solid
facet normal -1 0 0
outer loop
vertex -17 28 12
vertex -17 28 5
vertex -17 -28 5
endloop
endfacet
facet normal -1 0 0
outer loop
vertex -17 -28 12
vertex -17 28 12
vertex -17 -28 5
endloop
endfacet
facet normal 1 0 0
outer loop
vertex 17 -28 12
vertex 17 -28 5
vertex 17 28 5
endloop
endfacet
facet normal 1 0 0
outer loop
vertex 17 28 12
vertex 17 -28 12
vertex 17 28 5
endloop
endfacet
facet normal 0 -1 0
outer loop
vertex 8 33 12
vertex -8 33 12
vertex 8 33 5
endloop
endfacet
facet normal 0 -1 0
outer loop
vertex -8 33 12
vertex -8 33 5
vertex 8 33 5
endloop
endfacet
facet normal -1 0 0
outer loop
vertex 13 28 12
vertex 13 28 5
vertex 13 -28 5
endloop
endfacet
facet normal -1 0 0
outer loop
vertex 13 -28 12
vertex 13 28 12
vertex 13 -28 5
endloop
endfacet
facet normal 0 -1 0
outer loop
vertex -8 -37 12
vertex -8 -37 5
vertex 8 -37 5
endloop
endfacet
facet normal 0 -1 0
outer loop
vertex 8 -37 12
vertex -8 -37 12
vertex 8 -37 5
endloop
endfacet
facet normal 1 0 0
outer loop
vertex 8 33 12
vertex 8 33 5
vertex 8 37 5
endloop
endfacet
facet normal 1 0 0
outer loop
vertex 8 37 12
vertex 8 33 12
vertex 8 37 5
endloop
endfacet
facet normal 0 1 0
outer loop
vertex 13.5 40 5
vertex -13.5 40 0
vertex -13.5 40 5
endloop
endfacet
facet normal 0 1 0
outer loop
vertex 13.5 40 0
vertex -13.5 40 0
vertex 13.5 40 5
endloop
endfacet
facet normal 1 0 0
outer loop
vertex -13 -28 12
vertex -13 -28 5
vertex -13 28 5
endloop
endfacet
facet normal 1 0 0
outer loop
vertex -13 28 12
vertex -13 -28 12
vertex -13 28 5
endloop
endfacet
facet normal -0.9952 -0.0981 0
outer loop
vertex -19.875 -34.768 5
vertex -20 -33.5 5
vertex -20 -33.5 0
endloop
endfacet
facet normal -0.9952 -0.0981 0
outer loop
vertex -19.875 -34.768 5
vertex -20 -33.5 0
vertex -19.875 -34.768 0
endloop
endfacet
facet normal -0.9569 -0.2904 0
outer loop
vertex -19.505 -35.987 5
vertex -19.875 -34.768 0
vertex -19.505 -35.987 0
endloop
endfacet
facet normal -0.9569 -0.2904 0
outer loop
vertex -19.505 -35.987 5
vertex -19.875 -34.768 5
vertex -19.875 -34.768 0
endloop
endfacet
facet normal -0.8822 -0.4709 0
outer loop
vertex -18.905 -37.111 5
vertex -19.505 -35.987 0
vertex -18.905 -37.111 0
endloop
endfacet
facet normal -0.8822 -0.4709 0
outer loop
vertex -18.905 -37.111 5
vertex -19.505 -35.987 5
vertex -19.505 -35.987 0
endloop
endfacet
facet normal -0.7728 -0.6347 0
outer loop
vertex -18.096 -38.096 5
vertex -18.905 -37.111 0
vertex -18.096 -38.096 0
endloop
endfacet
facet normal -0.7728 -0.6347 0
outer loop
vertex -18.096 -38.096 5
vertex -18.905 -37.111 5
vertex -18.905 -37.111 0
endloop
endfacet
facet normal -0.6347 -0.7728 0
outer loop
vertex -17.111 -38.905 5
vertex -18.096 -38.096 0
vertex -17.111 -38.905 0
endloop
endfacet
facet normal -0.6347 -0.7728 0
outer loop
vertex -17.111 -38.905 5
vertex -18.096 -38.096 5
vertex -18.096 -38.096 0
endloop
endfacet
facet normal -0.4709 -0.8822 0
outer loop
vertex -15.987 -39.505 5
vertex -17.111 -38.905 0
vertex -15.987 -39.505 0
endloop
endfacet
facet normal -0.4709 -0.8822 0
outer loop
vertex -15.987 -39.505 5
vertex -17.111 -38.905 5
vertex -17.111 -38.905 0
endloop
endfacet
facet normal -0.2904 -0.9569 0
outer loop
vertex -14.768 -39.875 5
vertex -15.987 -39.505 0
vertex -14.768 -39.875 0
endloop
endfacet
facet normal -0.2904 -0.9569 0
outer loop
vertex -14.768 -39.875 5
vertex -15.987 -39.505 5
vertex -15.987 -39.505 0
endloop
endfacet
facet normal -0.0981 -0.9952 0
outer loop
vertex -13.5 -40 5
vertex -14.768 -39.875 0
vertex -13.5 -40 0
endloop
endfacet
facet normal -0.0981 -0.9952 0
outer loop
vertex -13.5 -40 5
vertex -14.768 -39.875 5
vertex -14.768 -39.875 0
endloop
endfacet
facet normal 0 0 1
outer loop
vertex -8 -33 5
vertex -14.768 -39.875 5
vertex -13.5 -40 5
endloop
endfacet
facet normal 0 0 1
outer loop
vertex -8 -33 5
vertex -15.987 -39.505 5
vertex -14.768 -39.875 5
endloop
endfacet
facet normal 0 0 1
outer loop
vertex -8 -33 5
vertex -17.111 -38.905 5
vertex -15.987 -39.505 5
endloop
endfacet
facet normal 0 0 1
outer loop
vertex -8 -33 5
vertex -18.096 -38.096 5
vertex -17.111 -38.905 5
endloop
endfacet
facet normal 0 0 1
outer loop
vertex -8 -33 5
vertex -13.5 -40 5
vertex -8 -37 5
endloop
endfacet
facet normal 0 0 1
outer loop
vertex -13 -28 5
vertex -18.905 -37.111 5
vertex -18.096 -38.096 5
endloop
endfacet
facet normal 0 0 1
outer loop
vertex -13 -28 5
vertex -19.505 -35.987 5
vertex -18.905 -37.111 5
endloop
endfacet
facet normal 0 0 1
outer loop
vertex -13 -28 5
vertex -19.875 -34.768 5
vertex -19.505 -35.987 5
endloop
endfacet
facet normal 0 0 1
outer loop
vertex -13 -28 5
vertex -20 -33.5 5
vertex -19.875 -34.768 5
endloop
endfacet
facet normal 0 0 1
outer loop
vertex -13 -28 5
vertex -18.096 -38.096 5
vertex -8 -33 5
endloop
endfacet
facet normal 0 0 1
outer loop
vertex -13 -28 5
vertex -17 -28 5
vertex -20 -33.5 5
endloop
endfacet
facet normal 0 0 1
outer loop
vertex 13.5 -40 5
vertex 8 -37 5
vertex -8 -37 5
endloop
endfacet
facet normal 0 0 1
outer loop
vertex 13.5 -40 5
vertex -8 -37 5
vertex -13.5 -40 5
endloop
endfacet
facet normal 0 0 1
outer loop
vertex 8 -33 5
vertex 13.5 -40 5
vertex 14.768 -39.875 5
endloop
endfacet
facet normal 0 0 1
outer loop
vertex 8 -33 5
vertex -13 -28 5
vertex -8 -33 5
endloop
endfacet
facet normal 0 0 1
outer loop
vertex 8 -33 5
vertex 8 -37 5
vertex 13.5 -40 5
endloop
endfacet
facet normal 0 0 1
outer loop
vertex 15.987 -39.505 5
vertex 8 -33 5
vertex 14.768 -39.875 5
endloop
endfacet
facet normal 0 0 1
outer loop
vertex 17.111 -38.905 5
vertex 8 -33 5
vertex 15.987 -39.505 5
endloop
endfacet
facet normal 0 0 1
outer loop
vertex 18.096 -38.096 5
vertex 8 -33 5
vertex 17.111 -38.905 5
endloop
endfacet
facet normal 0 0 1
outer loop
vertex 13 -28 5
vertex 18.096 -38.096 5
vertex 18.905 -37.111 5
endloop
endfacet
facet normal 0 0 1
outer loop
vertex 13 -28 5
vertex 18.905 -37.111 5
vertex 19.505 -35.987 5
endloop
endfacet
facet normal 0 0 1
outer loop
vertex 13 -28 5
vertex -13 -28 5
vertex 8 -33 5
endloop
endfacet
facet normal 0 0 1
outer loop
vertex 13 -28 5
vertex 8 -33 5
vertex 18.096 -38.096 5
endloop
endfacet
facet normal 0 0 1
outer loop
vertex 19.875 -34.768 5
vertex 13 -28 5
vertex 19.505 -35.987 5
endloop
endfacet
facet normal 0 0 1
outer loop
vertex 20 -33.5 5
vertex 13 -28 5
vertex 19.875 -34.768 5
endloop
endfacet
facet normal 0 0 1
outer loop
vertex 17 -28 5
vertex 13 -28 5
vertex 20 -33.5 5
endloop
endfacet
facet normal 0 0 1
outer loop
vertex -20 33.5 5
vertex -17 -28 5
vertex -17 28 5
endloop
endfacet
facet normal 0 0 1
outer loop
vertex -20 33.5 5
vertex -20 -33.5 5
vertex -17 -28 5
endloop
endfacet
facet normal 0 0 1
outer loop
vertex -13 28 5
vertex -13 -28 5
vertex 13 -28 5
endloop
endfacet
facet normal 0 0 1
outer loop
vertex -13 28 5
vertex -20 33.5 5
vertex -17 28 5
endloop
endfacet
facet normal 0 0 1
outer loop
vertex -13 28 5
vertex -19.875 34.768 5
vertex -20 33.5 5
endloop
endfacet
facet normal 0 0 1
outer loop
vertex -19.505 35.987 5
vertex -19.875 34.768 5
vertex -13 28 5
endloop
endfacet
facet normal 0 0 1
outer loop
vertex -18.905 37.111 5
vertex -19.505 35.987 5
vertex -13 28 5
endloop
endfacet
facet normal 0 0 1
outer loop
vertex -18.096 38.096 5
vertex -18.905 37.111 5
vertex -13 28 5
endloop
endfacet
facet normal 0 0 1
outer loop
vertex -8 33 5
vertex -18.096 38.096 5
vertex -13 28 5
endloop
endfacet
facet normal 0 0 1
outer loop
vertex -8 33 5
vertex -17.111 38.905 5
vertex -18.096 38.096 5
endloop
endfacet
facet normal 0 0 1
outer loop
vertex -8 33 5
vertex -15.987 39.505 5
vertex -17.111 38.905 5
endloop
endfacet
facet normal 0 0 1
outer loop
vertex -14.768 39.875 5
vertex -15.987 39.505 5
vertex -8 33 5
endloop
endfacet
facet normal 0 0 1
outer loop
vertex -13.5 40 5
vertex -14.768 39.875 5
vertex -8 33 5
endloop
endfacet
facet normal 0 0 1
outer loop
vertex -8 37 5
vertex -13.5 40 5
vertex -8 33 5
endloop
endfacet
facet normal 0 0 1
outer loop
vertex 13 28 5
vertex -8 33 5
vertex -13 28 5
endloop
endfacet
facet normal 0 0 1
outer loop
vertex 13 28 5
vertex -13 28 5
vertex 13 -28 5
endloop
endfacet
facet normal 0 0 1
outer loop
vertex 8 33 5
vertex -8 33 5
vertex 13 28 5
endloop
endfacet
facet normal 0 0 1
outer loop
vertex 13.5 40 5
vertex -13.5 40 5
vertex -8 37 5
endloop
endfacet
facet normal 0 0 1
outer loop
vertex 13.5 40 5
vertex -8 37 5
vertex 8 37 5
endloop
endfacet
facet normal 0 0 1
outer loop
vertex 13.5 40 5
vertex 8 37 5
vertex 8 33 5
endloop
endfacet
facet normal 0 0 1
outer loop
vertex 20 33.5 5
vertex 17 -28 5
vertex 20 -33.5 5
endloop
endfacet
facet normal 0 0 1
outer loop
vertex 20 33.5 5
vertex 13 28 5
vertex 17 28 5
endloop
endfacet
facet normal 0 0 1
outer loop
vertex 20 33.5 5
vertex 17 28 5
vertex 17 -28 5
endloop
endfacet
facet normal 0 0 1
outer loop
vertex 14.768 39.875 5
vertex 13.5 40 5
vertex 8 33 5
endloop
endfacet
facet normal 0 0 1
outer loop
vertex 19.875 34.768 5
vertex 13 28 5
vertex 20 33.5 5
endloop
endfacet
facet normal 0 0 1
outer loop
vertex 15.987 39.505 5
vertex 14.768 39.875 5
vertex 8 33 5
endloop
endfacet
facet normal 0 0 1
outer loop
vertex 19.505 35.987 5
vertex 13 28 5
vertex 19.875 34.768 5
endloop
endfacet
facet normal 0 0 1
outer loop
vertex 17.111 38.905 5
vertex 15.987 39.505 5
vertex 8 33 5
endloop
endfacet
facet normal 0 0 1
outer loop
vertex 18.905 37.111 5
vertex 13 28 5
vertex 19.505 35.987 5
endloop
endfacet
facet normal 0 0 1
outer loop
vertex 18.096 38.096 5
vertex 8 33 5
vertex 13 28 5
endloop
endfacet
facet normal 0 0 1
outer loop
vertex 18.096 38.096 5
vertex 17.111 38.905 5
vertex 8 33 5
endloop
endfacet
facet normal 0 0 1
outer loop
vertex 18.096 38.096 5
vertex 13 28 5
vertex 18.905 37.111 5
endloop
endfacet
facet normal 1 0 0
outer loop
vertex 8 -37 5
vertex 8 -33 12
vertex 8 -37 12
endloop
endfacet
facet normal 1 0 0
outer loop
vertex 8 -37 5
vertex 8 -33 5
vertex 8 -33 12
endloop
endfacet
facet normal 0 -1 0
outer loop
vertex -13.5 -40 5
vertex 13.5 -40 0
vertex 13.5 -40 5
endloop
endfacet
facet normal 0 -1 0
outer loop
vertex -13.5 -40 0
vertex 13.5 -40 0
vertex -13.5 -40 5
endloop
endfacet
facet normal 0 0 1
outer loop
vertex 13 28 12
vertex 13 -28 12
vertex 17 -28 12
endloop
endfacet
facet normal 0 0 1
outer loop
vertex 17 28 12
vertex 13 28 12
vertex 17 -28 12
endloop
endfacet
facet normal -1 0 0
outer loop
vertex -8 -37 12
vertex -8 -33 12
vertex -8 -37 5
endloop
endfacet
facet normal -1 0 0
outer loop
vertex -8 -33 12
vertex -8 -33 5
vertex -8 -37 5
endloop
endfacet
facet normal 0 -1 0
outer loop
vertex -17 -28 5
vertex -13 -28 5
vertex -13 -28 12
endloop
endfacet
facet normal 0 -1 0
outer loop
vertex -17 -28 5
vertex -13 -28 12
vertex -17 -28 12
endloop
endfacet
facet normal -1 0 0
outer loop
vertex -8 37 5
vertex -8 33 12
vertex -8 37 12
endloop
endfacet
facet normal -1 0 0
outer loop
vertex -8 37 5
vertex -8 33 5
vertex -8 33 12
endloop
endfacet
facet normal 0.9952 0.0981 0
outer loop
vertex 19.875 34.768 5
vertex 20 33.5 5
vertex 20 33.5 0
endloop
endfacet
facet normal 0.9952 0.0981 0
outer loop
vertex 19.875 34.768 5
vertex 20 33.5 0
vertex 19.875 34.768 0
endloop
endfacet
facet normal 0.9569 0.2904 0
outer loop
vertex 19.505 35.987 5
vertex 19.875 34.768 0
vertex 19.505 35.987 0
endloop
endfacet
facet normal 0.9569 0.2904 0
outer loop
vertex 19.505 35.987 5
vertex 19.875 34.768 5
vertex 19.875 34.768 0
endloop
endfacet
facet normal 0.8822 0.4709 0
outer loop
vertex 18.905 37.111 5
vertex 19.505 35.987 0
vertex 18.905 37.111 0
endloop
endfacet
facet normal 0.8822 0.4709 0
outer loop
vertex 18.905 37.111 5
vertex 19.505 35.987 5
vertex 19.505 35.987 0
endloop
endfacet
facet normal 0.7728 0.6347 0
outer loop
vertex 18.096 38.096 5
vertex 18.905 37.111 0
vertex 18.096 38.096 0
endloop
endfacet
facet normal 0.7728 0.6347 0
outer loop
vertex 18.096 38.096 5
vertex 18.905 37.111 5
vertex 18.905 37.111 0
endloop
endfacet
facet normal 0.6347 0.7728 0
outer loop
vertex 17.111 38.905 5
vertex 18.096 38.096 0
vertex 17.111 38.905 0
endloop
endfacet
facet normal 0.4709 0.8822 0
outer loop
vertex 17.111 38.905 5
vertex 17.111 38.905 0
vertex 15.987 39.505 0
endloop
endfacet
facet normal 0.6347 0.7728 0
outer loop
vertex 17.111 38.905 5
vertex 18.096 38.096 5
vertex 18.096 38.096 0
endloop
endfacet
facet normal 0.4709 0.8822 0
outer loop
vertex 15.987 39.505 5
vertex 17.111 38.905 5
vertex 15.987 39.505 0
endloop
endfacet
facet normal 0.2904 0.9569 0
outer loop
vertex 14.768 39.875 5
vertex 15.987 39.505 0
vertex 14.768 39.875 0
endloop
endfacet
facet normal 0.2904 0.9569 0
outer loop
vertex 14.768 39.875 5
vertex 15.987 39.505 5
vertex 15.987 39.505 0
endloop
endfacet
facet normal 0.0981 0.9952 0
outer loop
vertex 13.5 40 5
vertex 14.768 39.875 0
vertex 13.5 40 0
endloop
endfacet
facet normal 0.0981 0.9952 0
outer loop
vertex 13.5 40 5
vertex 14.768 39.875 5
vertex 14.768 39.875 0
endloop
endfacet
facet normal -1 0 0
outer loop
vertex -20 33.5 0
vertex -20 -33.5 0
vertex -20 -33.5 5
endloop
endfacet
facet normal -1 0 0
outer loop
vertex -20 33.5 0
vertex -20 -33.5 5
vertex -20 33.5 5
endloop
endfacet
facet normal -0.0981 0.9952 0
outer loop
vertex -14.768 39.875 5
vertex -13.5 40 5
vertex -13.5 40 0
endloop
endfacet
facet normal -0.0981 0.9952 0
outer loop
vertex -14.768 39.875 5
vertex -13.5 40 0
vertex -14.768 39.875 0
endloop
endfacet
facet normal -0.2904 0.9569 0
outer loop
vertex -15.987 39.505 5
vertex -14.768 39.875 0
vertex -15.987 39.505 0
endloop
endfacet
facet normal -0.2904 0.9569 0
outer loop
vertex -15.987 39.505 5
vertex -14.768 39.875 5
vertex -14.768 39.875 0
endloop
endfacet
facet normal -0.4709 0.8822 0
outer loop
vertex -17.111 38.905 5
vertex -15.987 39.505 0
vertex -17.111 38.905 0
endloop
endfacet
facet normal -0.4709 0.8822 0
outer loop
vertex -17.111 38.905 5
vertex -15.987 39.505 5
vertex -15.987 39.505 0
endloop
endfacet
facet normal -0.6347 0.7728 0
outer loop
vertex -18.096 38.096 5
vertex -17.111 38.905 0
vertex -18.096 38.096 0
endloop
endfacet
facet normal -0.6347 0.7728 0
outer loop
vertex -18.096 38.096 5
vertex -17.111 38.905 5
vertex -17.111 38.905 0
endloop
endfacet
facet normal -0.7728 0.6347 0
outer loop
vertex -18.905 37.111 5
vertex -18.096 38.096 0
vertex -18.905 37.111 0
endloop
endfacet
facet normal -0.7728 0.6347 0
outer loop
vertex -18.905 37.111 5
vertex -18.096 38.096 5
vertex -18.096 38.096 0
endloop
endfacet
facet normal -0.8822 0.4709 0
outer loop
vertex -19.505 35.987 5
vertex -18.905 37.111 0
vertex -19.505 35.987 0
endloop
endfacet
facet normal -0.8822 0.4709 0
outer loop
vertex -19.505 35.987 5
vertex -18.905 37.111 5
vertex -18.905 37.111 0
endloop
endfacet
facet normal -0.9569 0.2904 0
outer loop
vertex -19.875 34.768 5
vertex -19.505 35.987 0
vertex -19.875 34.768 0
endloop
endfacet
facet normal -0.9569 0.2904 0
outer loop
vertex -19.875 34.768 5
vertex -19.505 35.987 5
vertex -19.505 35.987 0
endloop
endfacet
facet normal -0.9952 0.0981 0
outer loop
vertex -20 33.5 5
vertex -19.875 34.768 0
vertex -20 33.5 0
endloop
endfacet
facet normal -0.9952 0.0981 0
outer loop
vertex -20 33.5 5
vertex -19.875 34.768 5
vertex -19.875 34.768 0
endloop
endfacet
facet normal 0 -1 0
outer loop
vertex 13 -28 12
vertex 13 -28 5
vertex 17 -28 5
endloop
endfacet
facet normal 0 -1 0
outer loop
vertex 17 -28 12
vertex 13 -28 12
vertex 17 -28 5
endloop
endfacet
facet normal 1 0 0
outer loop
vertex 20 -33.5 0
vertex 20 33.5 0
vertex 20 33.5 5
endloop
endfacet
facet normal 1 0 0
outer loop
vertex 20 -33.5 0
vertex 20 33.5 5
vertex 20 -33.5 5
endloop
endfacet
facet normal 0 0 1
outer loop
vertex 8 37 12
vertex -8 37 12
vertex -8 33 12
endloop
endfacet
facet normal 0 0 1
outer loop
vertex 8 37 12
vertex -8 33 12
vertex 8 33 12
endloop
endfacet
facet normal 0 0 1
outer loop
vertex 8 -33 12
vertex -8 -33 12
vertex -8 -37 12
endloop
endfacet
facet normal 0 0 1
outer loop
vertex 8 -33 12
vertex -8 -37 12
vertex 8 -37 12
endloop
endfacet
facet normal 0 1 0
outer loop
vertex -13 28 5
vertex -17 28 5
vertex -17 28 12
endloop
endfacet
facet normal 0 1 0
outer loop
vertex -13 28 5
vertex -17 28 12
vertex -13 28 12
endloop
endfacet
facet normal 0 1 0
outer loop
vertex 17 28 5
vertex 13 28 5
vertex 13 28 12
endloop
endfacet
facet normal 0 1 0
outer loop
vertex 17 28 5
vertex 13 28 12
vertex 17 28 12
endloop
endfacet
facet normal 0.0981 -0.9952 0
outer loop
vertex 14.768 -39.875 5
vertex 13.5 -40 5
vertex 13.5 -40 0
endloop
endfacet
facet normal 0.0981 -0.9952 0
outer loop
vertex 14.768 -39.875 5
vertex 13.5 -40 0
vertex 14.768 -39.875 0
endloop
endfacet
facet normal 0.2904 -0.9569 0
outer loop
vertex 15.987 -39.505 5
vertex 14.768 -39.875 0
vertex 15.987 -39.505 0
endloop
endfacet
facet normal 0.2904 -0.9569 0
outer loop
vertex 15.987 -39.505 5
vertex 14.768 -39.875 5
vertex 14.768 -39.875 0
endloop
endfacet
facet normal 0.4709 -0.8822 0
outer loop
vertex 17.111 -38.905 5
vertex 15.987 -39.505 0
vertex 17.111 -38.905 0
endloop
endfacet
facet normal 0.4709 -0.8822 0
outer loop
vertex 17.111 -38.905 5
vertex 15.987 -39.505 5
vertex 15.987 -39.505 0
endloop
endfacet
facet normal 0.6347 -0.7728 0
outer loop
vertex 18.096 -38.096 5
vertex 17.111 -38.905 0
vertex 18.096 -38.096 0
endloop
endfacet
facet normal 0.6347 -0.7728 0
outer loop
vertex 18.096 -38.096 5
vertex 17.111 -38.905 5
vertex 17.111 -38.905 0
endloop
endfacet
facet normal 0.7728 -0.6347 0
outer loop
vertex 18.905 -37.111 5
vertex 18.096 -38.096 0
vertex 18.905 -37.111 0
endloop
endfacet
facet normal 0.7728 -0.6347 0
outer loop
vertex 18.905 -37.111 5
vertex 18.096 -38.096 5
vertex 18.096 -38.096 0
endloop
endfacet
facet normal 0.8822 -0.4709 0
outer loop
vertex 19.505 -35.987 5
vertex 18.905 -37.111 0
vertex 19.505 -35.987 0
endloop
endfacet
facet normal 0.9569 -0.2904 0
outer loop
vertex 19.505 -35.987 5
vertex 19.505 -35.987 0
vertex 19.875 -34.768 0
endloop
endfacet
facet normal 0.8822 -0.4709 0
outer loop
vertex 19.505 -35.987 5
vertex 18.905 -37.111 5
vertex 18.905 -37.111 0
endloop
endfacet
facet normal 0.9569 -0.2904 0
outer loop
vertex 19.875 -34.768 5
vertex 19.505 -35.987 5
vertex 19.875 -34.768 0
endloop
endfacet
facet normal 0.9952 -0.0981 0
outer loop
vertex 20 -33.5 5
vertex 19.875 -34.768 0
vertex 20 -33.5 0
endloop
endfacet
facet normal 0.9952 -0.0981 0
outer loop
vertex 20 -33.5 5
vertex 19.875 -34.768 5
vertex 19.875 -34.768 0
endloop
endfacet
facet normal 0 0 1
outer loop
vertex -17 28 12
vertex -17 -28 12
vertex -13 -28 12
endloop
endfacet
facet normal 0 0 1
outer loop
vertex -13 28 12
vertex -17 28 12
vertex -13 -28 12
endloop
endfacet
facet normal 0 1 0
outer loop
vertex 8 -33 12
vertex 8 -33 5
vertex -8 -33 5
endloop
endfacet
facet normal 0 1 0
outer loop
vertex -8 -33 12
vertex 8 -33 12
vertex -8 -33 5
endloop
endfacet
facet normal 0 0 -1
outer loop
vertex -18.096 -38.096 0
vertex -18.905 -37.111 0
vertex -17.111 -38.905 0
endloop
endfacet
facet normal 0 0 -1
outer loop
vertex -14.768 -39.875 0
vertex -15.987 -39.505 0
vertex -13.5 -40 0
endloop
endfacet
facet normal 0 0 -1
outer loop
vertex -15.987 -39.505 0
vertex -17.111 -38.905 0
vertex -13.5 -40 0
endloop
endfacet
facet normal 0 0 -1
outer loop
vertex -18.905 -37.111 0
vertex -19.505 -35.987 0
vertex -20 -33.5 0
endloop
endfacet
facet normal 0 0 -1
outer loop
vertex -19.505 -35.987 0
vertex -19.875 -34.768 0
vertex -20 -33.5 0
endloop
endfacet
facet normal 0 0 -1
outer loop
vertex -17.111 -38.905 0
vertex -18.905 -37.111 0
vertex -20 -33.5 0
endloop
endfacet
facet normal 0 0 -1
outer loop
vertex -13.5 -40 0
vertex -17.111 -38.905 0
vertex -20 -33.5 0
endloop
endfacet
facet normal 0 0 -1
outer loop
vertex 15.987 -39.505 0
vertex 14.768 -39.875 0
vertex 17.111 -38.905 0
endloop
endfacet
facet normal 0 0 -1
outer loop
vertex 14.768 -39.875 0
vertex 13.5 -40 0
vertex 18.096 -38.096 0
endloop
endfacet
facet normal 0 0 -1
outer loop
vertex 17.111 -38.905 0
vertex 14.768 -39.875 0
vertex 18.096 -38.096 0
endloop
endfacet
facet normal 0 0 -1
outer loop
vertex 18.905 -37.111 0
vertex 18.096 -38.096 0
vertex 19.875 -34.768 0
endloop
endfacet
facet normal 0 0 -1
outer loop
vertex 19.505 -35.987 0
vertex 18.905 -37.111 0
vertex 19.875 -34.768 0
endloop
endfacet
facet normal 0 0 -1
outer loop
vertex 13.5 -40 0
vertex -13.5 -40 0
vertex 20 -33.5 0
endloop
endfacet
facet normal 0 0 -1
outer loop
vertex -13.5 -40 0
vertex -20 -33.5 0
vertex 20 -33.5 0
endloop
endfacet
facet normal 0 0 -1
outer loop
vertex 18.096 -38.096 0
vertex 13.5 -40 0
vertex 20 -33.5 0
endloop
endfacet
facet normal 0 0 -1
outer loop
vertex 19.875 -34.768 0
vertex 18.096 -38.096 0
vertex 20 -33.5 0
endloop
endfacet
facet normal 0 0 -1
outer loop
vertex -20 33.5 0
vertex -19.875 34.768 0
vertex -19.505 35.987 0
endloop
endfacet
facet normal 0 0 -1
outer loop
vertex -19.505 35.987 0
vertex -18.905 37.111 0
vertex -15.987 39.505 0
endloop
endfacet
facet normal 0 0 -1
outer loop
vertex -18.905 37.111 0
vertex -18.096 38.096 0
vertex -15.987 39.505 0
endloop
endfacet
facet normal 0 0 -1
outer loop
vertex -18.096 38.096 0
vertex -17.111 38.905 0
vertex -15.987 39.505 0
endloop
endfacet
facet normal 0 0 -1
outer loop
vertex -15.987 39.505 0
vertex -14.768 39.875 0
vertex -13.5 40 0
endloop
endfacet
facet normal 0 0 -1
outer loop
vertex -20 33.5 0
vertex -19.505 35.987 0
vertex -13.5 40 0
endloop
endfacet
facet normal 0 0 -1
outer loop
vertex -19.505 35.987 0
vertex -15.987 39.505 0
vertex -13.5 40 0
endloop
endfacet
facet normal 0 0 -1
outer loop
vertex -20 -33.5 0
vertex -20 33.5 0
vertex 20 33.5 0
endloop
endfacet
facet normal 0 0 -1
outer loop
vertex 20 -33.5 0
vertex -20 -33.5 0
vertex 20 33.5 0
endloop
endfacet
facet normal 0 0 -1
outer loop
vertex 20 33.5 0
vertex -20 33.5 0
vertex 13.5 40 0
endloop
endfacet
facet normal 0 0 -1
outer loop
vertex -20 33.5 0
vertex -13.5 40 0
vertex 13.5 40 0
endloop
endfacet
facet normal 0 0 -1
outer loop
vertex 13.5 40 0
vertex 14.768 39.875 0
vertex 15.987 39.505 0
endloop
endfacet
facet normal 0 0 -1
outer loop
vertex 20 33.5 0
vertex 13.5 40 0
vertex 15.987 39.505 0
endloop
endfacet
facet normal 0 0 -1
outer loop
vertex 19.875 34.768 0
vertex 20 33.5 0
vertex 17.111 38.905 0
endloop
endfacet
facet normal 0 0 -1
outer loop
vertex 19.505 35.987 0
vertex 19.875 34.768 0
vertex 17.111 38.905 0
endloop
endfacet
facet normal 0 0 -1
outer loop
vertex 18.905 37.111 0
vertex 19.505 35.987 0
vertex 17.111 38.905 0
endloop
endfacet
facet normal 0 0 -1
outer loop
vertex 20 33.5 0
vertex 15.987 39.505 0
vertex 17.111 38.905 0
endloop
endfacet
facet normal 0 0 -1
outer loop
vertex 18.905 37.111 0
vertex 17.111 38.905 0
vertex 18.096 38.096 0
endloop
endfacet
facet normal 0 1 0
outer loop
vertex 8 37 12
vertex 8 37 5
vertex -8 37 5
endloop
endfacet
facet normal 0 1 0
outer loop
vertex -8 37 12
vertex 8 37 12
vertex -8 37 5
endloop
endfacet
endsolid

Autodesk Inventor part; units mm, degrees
ref_plane "YZ Plane" through (0, 0, 0) normal (1, 0, 0) x (0, 1, 0)
ref_plane "XZ Plane" through (0, 0, 0) normal (0, 1, 0) x (-1, 0, 0)
ref_plane "XY Plane" through (0, 0, 0) normal (0, 0, 1) x (1, 0, 0)
sketch "Boceto1" plane through (0, 0, 0) normal (0, 0, 1) x (1, 0, 0)
  line L0 (20, -40) -> (-20, -40)
  line L1 (-20, -40) -> (-20, 40)
  line L2 (-20, 40) -> (20, 40)
  line L3 (20, 40) -> (20, -40)
  line L4 (20, -40) -> (-20, 40) construction
  line L5 (-20, -40) -> (20, 40) construction
  point P0 (0, 0)
  dimension "d0" = 40
  dimension "d22" = 80
extrude "Extrusión1" add sketch "Boceto1" along normal blind 5
sketch "Boceto2" plane through (0, 0, 5) normal (0, 0, 1) x (1, 0, 0)
  line L0 (17.5, -37.5) -> (-17.5, -37.5)
  line L1 (-17.5, -37.5) -> (-17.5, 37.5)
  line L2 (-17.5, 37.5) -> (17.5, 37.5)
  line L3 (17.5, 37.5) -> (17.5, -37.5)
  line L4 (17.5, -37.5) -> (-17.5, 37.5) construction
  line L5 (-17.5, -37.5) -> (17.5, 37.5) construction
  line L6 (17, 37) -> (-17, 37)
  line L7 (-17, 37) -> (-17, -37)
  line L8 (-17, -37) -> (17, -37)
  line L9 (17, -37) -> (17, 37)
  line L10 (-13, 33) -> (13, 33)
  line L11 (13, 33) -> (13, -33)
  line L12 (13, -33) -> (-13, -33)
  line L13 (-13, -33) -> (-13, 33)
  line L14 (8, 33) -> (8, 37)
  line L15 (-8, 33) -> (-8, 37)
  line L16 (13, 28) -> (17, 28)
  line L17 (13, -28) -> (17, -28)
  line L18 (-13, -28) -> (-17, -28)
  line L19 (-8, -33) -> (-8, -37)
  line L20 (8, -33) -> (8, -37)
  line L21 (-17, 28) -> (-13, 28)
  point P0 (0, 0)
  dimension "d5" = 35
  dimension "d6" = 75
  dimension "d7" = 0.5
  dimension "d8" = 4
  dimension "d9" = 5
  dimension "d10" = 5
  dimension "d11" = 5
  dimension "d12" = 5
  dimension "d13" = 5
  dimension "d14" = 5
  dimension "d15" = 5
  dimension "d16" = 5
extrude "Extrusión2" add sketch "Boceto2" along normal blind 7 contours L14 L10 L15 L6 | L9 L17 L11 L16 | L21 L13 L18 L7 | L8 L19 L12 L20
fillet "Empalme3" radius 6.5 4 edges at (20, 40, 2.5) (-20, 40, 2.5) (20, -40, 2.5) (-20, -40, 2.5)
properties part number "Tapacanto Superior"
